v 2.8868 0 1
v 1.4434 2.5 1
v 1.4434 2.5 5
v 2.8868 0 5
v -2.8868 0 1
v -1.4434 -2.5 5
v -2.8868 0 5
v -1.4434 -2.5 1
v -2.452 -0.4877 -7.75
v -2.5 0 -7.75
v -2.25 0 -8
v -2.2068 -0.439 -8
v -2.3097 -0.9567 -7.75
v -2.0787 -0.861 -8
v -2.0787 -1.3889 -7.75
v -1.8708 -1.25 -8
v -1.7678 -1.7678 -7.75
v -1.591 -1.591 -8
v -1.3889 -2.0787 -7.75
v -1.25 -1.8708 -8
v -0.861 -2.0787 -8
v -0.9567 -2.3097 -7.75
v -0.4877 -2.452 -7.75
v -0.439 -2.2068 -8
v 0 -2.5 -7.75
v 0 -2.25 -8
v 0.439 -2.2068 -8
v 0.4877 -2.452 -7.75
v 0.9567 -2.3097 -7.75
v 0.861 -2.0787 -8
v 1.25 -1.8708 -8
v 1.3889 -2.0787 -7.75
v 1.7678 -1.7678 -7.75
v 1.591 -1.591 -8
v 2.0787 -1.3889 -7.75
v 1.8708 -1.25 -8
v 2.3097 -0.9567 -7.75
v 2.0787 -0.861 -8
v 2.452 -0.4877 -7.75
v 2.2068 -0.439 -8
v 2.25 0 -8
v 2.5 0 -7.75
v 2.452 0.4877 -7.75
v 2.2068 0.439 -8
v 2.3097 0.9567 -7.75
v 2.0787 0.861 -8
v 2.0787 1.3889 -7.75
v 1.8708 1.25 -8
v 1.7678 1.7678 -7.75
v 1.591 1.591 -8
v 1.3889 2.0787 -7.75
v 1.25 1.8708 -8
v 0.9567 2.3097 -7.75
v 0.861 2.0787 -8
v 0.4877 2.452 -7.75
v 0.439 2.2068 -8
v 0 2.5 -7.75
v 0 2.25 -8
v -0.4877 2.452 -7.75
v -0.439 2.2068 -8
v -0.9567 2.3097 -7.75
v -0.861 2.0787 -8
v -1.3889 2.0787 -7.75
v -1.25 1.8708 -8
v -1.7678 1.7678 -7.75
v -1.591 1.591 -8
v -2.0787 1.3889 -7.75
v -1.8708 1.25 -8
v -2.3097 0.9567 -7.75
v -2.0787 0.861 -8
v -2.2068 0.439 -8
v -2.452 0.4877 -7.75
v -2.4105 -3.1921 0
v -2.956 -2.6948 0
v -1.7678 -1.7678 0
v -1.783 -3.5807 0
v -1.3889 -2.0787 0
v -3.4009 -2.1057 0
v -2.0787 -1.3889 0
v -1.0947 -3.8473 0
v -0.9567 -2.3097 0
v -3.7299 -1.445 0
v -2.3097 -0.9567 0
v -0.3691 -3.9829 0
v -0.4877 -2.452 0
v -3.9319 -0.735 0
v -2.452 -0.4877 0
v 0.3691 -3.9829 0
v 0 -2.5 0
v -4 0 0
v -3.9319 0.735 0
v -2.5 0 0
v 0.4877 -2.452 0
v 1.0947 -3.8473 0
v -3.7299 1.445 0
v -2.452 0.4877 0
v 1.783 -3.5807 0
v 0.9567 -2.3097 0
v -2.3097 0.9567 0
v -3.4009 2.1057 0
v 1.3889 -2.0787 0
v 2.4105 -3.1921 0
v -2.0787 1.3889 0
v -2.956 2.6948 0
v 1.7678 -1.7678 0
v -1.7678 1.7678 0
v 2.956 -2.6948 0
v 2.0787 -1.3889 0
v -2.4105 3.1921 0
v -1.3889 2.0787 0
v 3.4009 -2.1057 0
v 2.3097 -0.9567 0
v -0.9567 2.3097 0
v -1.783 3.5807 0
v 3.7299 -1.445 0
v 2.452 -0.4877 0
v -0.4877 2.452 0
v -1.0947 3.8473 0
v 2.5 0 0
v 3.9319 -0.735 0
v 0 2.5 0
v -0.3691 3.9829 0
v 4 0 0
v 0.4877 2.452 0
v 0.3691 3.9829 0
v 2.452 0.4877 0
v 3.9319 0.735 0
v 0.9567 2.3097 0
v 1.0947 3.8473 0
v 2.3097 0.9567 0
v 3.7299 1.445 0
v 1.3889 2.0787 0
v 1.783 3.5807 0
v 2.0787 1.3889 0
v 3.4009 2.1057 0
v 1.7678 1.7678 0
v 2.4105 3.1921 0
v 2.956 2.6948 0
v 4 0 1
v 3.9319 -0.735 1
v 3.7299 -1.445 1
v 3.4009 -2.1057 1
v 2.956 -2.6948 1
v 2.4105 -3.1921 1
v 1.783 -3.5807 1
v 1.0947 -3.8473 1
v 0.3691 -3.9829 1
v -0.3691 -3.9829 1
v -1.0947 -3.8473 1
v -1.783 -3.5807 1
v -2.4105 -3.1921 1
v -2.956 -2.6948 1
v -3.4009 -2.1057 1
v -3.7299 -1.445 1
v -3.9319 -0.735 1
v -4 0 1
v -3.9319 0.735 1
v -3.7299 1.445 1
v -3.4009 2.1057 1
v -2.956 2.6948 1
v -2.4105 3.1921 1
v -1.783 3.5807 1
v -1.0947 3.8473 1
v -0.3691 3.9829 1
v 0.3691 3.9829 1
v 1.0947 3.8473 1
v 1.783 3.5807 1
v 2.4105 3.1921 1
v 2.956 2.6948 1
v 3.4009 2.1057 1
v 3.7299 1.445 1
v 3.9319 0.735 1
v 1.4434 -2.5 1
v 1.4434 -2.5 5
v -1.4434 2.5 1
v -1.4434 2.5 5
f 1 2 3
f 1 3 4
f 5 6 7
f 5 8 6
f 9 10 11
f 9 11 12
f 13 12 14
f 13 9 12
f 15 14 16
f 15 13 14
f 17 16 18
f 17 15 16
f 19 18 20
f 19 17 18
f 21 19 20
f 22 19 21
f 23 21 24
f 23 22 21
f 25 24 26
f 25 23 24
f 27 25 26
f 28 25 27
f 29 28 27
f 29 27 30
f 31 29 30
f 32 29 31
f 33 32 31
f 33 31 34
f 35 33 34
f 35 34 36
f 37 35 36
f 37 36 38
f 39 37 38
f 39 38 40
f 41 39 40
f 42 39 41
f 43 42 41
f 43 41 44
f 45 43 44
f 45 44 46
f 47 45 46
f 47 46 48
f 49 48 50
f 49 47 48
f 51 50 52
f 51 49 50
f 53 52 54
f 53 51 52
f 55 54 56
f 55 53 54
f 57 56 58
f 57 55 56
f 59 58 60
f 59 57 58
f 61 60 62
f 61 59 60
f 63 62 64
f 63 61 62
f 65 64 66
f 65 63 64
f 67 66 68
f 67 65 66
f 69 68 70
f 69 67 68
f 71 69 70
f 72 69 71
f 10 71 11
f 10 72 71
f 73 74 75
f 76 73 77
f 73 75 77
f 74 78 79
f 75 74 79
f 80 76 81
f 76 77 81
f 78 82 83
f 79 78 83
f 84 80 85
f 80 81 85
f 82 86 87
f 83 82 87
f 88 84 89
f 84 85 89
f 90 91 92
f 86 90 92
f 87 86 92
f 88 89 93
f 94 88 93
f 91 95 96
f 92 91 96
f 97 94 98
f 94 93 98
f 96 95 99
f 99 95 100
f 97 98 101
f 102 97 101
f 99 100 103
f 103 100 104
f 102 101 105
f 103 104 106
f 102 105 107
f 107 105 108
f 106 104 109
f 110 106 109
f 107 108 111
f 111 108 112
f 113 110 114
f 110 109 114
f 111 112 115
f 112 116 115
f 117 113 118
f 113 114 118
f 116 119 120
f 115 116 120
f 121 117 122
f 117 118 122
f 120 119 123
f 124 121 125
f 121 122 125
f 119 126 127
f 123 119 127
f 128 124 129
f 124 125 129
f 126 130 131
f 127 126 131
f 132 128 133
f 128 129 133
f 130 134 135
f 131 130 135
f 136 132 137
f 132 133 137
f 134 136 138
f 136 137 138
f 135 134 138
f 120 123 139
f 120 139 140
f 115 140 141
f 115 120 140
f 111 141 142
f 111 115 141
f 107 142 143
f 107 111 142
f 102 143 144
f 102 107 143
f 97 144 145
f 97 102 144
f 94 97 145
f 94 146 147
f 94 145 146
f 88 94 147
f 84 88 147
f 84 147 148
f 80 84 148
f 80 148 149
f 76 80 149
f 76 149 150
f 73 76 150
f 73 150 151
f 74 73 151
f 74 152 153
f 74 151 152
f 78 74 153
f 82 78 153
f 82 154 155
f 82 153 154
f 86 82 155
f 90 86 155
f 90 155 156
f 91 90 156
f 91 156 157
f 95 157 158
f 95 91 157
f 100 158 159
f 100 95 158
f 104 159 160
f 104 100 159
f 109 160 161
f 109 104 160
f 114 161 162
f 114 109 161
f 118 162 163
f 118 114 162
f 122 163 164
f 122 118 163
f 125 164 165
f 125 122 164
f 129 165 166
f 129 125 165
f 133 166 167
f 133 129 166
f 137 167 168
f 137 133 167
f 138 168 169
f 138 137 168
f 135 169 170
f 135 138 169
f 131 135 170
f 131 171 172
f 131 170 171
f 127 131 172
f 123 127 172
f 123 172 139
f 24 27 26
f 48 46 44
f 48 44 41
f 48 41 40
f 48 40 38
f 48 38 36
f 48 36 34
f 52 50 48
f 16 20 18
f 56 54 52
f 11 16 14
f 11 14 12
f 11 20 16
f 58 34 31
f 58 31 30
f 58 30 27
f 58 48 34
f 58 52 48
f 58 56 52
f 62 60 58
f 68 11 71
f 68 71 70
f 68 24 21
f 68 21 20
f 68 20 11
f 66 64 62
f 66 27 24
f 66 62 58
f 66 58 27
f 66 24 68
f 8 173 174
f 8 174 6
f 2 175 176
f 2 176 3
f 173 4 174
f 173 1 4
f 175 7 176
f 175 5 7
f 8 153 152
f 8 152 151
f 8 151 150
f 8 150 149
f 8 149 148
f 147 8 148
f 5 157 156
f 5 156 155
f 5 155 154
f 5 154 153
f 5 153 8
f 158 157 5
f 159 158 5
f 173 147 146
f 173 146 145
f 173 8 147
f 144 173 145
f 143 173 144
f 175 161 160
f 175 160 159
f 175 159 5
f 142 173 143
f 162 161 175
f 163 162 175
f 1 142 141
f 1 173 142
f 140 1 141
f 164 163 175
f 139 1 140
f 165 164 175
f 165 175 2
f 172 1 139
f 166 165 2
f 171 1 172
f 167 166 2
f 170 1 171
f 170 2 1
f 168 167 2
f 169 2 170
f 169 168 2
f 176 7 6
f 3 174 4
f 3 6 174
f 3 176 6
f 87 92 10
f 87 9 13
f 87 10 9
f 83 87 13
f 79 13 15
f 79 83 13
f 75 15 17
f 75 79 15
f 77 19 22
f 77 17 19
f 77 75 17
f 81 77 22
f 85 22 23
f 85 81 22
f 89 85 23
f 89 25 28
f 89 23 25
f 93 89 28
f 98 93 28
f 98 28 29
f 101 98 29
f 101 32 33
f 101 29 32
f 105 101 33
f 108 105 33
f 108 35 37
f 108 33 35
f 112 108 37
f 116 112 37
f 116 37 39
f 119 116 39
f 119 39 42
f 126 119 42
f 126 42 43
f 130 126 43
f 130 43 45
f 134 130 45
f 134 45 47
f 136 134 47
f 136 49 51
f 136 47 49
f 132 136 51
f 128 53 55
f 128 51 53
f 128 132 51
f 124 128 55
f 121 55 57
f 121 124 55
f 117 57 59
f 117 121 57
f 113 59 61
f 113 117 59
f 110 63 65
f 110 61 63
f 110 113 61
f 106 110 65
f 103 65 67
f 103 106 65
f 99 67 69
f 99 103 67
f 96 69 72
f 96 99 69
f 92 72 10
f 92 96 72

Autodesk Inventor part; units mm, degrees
ref_plane "YZ Plane" through (0, 0, 0) normal (1, 0, 0) x (0, 1, 0)
ref_plane "XZ Plane" through (0, 0, 0) normal (0, 1, 0) x (-1, 0, 0)
ref_plane "XY Plane" through (0, 0, 0) normal (0, 0, 1) x (1, 0, 0)
sketch "草图1" plane through (0, 0, 0) normal (0, 0, 1) x (1, 0, 0)
  circle A0 centre (0, 0) radius 4
  dimension "d0" = 8
extrude "拉伸1" add sketch "草图1" along normal blind 1
sketch "草图2" plane through (0, 0, 1) normal (0, 0, 1) x (1, 0, 0)
  line L0 (1.4434, -2.5) -> (-1.4434, -2.5)
  line L1 (-1.4434, -2.5) -> (-2.8868, 0)
  line L2 (-2.8868, 0) -> (-1.4434, 2.5)
  line L3 (-1.4434, 2.5) -> (1.4434, 2.5)
  line L4 (1.4434, 2.5) -> (2.8868, 0)
  line L5 (2.8868, 0) -> (1.4434, -2.5)
  line L6 (0, 0) -> (0, 2.5)
  dimension "d3" = 5
extrude "拉伸2" add sketch "草图2" along normal blind 4
sketch "草图3" plane through (0, 0, 0) normal (0, 0, -1) x (-1, 0, 0)
  circle A0 centre (0, 0) radius 2.5
  dimension "d6" = 5
extrude "拉伸3" add sketch "草图3" along normal blind 8
thread "螺纹1" size "M5x0.8" class "6g" standard "ANSI Metric M Profile" full length
chamfer "倒角1" distance 0.25 angle 45 1 edges at (2.5, 0, -8)
properties part number "装填斗罩螺丝"
